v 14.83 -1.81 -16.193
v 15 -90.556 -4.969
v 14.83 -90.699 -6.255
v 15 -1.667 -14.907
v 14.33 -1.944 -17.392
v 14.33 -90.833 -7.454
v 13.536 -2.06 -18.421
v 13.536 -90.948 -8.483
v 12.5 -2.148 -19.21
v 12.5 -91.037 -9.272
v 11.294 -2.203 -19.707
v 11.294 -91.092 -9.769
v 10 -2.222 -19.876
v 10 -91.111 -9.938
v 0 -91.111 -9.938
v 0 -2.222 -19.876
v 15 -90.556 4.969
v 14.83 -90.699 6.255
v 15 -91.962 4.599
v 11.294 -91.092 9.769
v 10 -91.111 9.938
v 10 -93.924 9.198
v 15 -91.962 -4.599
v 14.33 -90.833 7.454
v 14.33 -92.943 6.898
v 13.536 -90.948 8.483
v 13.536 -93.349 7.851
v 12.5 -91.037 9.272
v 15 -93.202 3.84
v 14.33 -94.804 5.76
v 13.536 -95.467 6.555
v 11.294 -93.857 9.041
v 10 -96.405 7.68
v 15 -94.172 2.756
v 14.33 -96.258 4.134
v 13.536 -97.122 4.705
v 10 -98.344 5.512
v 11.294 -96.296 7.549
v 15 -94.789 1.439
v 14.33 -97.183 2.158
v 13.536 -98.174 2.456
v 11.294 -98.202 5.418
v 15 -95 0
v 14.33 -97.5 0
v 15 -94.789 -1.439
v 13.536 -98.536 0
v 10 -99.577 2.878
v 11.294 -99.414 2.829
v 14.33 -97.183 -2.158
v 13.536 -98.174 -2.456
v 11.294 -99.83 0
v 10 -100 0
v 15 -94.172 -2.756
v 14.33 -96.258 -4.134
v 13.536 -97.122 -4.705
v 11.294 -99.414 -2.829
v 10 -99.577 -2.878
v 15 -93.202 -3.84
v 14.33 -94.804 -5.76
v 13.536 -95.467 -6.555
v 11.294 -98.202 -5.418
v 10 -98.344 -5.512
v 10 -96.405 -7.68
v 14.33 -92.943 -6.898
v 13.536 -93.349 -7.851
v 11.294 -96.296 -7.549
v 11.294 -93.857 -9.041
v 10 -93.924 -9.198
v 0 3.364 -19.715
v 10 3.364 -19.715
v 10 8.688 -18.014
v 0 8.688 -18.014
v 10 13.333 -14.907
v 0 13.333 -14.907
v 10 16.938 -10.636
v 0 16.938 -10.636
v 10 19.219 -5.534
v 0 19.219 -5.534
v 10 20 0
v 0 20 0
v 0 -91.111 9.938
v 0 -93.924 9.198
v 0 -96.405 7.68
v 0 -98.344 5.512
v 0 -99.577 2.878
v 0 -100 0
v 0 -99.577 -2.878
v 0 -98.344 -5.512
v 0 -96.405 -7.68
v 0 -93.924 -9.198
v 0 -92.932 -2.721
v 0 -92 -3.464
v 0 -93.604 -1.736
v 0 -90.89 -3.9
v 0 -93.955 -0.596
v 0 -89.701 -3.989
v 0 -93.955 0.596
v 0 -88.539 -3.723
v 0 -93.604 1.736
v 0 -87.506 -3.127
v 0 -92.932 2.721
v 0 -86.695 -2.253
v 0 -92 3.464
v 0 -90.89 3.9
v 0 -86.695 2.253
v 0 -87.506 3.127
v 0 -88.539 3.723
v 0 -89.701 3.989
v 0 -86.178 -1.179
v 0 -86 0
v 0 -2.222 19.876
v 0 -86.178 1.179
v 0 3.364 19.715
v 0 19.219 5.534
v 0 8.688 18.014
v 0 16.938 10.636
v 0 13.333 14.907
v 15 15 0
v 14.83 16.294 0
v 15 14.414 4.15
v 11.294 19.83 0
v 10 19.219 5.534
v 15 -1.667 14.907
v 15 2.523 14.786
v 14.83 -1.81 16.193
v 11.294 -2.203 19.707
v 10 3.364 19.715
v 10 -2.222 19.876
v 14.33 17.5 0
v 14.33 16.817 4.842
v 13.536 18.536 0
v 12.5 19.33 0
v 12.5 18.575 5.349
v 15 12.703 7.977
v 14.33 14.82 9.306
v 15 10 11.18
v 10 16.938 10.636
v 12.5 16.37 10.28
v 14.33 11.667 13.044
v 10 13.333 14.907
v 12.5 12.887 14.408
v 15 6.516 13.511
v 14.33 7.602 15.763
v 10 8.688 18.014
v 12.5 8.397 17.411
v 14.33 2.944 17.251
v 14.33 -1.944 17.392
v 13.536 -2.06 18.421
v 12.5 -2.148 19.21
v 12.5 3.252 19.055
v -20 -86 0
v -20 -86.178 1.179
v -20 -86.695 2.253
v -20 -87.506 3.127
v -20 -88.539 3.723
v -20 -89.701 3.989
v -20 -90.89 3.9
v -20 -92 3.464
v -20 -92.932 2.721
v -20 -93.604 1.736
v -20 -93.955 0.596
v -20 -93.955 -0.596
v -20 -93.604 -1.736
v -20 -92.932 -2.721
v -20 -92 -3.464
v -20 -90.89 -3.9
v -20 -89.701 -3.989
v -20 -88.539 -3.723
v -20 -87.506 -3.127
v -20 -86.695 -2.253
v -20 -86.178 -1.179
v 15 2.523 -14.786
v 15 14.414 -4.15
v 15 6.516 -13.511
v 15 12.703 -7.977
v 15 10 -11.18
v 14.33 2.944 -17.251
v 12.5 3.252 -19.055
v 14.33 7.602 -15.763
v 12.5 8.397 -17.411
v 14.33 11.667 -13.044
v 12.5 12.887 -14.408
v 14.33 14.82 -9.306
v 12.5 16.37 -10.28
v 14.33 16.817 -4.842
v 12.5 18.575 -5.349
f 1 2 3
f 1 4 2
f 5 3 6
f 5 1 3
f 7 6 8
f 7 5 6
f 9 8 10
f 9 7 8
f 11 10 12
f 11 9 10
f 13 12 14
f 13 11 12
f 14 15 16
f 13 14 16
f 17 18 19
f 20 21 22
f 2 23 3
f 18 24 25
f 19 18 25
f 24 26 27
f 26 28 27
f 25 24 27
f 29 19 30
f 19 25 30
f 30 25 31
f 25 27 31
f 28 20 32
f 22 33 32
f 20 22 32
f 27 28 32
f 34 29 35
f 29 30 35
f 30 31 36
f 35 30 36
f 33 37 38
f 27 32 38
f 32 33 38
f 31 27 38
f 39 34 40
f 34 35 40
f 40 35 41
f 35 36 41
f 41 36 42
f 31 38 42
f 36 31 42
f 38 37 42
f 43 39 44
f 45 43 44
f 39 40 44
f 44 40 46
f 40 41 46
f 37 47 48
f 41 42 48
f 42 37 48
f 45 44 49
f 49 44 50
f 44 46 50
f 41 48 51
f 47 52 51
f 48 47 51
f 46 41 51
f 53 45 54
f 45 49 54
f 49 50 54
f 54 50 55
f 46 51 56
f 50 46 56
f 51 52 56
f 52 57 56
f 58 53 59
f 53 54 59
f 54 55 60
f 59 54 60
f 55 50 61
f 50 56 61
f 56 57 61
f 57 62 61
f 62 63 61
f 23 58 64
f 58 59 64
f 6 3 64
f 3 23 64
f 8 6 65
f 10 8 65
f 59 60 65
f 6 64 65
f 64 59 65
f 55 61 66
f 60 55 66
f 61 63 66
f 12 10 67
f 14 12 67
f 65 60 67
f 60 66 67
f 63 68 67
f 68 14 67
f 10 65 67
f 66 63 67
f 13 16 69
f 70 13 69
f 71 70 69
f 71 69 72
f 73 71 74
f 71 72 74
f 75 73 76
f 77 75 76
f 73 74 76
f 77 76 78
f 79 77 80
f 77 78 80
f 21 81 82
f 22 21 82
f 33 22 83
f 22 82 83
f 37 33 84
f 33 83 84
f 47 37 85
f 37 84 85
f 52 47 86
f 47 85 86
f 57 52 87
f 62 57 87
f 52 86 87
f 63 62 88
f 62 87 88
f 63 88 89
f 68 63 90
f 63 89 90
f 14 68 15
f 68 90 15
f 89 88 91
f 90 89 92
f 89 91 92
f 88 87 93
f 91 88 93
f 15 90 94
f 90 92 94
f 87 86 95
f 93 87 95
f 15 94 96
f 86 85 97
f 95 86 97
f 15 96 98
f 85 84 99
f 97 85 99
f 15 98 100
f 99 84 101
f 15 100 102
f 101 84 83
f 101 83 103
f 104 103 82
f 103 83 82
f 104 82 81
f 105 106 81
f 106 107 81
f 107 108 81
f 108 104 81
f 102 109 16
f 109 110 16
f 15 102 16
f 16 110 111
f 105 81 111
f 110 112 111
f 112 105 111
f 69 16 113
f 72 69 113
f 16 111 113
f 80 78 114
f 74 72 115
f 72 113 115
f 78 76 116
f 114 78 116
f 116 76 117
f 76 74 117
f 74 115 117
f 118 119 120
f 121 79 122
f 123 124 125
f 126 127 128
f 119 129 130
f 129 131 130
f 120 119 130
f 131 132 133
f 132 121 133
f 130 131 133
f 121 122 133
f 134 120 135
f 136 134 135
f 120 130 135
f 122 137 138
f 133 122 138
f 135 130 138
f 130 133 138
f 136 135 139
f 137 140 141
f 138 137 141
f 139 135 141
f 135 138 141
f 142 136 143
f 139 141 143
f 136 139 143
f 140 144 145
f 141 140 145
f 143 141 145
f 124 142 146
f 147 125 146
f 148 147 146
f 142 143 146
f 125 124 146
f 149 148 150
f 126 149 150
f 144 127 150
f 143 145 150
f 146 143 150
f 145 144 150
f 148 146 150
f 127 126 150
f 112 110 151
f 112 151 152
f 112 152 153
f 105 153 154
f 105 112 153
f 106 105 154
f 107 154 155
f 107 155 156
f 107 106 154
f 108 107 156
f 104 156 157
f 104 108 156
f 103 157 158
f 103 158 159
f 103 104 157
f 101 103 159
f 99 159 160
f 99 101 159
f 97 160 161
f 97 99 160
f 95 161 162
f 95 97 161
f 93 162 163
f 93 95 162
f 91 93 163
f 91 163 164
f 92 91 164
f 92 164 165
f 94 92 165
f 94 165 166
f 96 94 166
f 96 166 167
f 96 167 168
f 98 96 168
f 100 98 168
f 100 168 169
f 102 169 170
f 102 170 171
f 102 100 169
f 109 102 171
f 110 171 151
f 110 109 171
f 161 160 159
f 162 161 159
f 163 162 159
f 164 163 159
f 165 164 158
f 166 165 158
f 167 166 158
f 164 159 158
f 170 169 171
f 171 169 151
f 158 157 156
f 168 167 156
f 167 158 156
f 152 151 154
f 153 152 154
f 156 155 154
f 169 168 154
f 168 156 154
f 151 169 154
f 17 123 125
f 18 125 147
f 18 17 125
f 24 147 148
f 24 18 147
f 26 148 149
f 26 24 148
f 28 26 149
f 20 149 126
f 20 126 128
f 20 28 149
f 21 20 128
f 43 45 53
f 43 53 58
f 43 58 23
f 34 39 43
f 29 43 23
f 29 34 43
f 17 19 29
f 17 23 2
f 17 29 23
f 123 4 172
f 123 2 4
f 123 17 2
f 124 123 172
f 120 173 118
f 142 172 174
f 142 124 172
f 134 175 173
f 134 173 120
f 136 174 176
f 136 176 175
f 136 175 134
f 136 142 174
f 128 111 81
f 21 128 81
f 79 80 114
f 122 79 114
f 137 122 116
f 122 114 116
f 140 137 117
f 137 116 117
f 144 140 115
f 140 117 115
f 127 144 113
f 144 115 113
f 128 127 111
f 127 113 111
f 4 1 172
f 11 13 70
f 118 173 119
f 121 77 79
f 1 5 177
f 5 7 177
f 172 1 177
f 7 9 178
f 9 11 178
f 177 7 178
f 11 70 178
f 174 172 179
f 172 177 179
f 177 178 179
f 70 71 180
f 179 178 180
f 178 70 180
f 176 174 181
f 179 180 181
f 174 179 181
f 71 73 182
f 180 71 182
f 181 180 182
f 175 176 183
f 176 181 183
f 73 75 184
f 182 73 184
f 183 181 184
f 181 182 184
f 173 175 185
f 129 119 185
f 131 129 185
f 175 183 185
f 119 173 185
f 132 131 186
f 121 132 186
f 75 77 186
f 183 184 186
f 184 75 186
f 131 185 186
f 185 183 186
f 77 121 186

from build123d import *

# Parameters (mm, degrees)
F1_DEPTH = 15
F2_R     = 4
F3_DEPTH = 20
F4_R     = 5


with BuildPart() as f1:
    # F0 (on Right) → F1 (new body)
    with BuildSketch(Plane.YZ):
        with BuildLine():
            ThreePointArc((-2.222222, -19.87616), (-20, 0), (-2.222222, 19.87616))
            Line((-2.222222, 19.87616), (-91.111111, 9.93808))
            ThreePointArc((-91.111111, 9.93808), (-83.333333, 7.45356), (-80, 0))
            ThreePointArc((-80, 0), (-83.333333, -7.45356), (-91.111111, -9.93808))
            Line((-91.111111, -9.93808), (-2.222222, -19.87616))
        make_face()
        with BuildLine():
            ThreePointArc((-2.222222, -19.87616), (13.333333, -14.90712), (20, 0))
            ThreePointArc((20, 0), (13.333333, 14.90712), (-2.222222, 19.87616))
            ThreePointArc((-2.222222, 19.87616), (-20, 0), (-2.222222, -19.87616))
        make_face()
        with BuildLine():
            ThreePointArc((-80, 0), (-83.333333, 7.45356), (-91.111111, 9.93808))
            ThreePointArc((-91.111111, 9.93808), (-100, 0), (-91.111111, -9.93808))
            ThreePointArc((-91.111111, -9.93808), (-83.333333, -7.45356), (-80, 0))
        make_face()
    extrude(amount=F1_DEPTH)

    # F2 (on Right) → F3 (join)
    with BuildSketch(Plane.YZ):
        with Locations((-90, 0)):
            Circle(F2_R)
    extrude(amount=-F3_DEPTH)

    # F4
    f4_edges = [f1.edges().sort_by_distance(p)[0] for p in [
        (15, 13.333333, -14.90712),
        (15, 13.333333, 14.90712),
        (15, -46.666667, 14.90712),
        (15, -100, 0),
        (15, -46.666667, -14.90712),
    ]]
    fillet(f4_edges, radius=F4_R)


solid = f1.part
